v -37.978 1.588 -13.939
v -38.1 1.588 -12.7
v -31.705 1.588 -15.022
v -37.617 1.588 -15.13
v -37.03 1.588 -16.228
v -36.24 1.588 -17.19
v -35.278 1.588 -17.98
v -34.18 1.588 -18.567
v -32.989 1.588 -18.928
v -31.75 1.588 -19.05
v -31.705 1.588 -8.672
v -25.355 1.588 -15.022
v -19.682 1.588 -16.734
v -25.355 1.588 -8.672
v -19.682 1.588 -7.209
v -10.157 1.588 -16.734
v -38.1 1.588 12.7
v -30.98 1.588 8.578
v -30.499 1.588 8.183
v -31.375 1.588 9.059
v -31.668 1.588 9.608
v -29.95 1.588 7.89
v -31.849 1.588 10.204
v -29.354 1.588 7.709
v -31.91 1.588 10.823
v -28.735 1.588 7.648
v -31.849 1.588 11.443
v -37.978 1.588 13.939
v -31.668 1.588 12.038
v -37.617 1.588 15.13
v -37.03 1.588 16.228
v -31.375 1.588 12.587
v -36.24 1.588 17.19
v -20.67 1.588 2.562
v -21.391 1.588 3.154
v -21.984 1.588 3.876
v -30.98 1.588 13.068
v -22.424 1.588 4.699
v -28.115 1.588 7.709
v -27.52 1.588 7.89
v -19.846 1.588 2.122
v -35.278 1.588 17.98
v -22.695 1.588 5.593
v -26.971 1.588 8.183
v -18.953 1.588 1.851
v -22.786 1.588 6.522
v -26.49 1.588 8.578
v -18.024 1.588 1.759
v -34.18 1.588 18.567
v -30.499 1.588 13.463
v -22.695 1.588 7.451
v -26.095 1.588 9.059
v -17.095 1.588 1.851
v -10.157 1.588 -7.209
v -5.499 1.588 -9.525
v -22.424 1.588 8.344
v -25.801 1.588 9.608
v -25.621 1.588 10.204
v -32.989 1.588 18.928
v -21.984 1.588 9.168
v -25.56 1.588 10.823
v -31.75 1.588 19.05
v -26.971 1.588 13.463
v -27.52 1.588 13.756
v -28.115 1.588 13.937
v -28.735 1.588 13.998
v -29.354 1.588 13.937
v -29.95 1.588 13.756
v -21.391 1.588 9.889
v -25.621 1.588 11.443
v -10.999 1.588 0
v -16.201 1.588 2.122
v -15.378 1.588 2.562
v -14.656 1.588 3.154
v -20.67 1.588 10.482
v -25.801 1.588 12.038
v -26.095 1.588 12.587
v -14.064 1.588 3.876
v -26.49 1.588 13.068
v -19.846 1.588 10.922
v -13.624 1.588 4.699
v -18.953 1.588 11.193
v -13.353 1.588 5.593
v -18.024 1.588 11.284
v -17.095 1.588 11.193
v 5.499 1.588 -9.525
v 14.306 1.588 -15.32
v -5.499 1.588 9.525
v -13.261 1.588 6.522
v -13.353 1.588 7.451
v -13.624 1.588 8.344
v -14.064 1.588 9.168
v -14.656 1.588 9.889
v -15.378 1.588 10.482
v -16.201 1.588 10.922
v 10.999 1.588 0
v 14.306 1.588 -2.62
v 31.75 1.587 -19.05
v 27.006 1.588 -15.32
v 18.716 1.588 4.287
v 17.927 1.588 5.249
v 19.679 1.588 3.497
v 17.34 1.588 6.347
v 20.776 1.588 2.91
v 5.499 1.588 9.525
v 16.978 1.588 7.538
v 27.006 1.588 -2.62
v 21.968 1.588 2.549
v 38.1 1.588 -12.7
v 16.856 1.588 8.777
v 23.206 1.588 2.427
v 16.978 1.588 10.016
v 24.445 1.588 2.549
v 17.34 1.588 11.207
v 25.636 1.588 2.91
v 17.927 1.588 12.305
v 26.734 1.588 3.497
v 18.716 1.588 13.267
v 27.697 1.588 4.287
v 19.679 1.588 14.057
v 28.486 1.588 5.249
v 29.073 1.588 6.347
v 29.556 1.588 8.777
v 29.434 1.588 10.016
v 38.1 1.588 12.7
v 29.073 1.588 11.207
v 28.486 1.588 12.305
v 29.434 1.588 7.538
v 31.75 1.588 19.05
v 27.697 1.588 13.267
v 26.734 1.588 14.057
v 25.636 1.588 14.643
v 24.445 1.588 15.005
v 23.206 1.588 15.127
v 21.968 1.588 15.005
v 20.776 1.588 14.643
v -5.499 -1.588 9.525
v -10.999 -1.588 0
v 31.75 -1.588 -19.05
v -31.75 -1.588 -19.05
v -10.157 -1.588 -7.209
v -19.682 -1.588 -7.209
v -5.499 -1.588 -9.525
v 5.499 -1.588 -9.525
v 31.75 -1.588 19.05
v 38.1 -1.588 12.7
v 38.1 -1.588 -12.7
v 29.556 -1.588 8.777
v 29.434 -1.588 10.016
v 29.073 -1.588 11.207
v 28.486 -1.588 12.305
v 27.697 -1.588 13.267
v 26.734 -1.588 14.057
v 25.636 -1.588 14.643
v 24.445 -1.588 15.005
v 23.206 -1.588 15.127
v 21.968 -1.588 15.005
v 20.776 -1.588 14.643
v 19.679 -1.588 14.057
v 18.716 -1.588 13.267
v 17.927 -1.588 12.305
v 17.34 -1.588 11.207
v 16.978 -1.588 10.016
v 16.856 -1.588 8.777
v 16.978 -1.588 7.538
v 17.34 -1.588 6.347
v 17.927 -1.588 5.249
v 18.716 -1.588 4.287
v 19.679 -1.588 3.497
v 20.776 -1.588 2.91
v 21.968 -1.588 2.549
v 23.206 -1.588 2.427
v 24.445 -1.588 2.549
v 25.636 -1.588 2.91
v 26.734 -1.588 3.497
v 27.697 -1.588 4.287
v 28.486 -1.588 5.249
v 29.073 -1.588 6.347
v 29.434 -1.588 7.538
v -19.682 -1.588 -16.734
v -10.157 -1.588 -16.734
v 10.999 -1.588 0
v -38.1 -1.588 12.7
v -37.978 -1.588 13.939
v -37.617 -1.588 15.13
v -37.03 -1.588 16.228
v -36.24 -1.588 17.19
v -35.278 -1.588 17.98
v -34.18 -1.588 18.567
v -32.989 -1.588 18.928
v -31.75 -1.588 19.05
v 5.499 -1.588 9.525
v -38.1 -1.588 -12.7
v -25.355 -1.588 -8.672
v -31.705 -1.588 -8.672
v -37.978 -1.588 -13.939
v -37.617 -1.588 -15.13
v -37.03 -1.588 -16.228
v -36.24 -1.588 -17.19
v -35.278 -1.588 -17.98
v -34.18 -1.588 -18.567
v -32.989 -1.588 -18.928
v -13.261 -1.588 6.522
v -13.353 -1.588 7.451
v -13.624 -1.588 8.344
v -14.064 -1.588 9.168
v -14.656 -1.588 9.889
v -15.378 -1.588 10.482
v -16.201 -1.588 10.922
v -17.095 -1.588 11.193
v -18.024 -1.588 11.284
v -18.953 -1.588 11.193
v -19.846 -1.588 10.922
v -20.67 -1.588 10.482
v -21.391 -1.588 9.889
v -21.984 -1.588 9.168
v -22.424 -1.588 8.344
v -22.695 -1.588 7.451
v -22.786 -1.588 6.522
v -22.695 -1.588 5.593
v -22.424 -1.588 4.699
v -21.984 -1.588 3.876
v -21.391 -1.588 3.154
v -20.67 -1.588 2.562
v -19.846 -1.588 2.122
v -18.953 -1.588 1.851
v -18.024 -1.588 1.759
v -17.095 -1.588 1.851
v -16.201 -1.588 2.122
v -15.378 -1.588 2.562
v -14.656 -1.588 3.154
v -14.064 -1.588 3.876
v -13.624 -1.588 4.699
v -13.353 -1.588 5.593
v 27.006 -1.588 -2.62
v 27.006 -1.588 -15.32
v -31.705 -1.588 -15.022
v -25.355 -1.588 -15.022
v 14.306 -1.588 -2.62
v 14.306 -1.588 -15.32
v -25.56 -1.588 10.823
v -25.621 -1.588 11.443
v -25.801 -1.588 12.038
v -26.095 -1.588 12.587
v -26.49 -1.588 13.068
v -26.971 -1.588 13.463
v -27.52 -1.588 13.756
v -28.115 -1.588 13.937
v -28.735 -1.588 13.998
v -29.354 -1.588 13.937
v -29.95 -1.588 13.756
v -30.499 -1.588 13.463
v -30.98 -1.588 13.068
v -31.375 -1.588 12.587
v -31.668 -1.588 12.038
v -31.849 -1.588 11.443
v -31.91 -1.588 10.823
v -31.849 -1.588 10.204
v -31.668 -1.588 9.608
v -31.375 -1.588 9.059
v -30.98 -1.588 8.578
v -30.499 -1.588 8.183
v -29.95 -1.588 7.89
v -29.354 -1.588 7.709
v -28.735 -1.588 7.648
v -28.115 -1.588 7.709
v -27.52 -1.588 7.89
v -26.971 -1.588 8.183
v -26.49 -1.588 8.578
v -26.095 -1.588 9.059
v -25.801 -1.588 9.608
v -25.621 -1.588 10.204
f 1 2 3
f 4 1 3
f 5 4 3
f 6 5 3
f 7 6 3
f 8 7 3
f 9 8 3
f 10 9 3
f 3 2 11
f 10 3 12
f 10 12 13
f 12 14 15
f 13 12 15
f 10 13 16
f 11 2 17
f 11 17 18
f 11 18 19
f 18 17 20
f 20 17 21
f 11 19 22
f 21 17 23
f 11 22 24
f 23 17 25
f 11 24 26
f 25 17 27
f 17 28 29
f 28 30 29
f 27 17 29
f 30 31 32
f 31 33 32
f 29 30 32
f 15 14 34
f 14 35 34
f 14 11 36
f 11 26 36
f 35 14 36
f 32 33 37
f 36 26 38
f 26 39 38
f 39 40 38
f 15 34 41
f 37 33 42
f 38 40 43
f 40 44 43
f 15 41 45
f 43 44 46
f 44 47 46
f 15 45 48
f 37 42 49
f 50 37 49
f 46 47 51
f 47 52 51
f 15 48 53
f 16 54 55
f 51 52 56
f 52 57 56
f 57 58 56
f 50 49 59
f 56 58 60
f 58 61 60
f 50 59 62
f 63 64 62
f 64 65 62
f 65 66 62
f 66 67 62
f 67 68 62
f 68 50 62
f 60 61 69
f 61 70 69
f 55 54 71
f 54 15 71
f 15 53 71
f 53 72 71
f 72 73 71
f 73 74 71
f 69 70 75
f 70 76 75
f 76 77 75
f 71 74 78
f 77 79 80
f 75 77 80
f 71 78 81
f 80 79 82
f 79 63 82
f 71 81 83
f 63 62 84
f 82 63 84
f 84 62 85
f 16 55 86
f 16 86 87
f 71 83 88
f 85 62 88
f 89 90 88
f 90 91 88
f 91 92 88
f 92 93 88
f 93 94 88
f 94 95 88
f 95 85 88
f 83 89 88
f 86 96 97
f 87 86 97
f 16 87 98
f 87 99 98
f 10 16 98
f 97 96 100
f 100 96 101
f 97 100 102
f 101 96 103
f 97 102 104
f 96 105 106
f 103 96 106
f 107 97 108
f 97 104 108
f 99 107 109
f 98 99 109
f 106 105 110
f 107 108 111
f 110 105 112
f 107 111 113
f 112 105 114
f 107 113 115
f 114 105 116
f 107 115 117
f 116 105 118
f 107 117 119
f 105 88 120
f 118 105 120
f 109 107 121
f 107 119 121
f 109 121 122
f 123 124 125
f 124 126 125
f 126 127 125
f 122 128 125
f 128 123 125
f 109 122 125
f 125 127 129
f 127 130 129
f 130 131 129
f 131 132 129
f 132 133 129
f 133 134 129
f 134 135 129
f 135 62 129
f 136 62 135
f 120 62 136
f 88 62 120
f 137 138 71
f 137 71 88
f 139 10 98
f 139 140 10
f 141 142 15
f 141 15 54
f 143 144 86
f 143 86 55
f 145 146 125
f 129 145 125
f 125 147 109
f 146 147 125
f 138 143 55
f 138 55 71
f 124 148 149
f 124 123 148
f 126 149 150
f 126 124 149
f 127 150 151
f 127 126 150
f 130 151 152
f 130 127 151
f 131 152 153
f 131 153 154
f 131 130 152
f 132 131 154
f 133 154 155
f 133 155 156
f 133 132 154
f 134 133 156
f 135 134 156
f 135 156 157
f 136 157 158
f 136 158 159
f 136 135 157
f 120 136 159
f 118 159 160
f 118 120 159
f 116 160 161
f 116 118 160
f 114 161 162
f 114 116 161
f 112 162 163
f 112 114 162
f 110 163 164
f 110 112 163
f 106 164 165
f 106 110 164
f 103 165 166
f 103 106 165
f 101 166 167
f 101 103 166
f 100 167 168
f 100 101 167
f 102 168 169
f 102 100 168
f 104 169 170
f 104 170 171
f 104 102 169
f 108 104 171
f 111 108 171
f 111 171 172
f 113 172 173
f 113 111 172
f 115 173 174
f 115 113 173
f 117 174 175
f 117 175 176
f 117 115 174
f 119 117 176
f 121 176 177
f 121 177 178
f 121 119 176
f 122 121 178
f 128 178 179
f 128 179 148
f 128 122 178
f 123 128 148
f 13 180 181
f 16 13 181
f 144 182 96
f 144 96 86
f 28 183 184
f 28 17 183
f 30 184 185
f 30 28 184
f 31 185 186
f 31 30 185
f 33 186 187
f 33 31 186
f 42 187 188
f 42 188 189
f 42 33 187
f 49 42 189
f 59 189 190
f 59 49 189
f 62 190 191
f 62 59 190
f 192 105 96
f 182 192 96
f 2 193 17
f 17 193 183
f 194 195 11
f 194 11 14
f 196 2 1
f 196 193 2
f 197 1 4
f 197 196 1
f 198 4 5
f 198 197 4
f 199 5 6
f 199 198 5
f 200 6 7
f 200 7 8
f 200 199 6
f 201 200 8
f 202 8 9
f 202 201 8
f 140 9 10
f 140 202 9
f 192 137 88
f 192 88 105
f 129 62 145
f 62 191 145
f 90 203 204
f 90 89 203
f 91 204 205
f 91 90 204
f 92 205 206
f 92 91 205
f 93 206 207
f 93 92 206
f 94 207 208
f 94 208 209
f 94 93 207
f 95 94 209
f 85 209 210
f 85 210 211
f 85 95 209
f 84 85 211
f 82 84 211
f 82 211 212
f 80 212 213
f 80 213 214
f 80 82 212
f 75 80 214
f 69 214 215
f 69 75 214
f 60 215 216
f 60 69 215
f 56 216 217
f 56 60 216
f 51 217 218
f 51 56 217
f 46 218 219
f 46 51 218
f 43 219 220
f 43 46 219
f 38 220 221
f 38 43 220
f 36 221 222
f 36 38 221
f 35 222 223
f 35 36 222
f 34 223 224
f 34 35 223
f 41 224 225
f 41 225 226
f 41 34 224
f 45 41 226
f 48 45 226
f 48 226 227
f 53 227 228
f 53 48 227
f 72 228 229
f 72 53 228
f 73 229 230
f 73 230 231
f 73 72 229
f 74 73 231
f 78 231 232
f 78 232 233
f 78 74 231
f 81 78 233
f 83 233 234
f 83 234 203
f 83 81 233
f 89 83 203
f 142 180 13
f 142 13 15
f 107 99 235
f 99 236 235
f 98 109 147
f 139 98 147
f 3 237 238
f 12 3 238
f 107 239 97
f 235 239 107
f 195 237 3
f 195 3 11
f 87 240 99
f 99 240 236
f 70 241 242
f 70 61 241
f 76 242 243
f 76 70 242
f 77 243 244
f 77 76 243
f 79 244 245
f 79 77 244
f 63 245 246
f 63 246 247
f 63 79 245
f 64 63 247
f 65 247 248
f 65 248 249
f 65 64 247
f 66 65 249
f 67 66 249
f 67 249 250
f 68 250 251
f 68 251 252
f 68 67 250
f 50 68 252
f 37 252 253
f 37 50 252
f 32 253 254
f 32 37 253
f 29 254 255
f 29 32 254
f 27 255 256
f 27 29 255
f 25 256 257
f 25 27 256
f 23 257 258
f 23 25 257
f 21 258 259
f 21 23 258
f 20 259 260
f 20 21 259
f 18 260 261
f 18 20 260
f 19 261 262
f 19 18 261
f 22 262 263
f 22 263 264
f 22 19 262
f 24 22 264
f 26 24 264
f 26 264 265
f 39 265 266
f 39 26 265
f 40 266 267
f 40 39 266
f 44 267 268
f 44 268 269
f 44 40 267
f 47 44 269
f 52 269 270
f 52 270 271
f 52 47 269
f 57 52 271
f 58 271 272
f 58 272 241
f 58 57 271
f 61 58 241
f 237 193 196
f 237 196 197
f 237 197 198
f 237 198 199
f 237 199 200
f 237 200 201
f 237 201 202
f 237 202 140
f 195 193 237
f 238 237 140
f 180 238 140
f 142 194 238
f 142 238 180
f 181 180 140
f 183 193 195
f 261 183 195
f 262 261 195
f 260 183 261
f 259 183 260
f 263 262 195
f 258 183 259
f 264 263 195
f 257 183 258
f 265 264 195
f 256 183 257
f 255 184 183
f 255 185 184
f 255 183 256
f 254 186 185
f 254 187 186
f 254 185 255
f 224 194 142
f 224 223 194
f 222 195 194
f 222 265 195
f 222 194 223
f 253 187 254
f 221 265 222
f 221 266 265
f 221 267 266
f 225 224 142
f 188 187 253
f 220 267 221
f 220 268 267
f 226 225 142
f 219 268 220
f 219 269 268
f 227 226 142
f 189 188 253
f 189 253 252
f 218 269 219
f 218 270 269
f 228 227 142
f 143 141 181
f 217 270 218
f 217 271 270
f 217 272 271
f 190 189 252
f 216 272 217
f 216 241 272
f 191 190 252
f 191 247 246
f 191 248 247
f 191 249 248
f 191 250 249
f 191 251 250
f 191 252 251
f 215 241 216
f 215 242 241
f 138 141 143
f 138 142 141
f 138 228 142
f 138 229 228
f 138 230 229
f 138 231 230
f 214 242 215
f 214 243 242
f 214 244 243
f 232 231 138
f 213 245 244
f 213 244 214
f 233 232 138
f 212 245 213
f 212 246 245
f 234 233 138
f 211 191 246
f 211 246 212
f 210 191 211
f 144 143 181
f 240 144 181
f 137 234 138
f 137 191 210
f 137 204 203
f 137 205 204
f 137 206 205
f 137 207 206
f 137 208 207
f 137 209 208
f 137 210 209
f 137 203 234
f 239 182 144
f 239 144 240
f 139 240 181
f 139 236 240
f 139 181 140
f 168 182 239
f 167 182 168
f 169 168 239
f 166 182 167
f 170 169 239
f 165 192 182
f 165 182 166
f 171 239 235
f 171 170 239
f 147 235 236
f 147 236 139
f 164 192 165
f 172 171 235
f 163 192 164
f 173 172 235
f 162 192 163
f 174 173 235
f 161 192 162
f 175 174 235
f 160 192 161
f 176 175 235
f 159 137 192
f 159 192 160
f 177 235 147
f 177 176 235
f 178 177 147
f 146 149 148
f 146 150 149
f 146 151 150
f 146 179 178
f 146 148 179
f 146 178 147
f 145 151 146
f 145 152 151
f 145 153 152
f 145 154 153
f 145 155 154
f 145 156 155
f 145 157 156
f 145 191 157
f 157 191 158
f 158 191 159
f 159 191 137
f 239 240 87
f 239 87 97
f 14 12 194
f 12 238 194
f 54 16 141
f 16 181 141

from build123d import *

# Parameters (mm, degrees)
F0_W     = 76.2
F0_H     = 38.1
F0_W_2   = 6.35
F0_H_2   = 6.35
F0_W_3   = 9.525
F0_H_3   = 9.525
F0_W_4   = 12.7
F0_H_4   = 12.7
F0_R     = 4.7625
F0_R_2   = 3.175
F0_R_3   = 6.35
F1_DEPTH = 1.5875
F2_R     = 6.35
F3_SIZE  = 6.35


with BuildPart() as f1:
    # F0 (on Front) → F1 (new body, symmetric)
    with BuildSketch(Plane.XZ):
        Rectangle(F0_W, F0_H)
        with Locations((-28.530458, -11.846916)):
            Rectangle(F0_W_2, F0_H_2, mode=Mode.SUBTRACT)
        with Locations((-14.919388, -11.971785)):
            Rectangle(F0_W_3, F0_H_3, mode=Mode.SUBTRACT)
        with Locations((20.656448, -8.97043)):
            Rectangle(F0_W_4, F0_H_4, mode=Mode.SUBTRACT)
        with Locations((-18.023899, 6.521787)):
            Circle(F0_R, mode=Mode.SUBTRACT)
        with Locations((-28.73469, 10.823162)):
            Circle(F0_R_2, mode=Mode.SUBTRACT)
        Polygon((-10.998523, 0), (-5.499261, 9.525), (5.499261, 9.525), (10.998523, 0), (5.499261, -9.525), (-5.499261, -9.525), align=None, mode=Mode.SUBTRACT)
        with Locations((23.2064, 8.776863)):
            Circle(F0_R_3, mode=Mode.SUBTRACT)
    extrude(amount=F1_DEPTH, both=True)

    # F2
    f2_edges = [f1.edges().sort_by_distance(p)[0] for p in [
        (-38.1, 0, 19.05),
        (-38.1, 0, -19.05),
    ]]
    fillet(f2_edges, radius=F2_R)

    # F3
    f3_edges = [f1.edges().sort_by_distance(p)[0] for p in [
        (38.1, 0, 19.05),
        (38.1, 0, -19.05),
    ]]
    chamfer(f3_edges, length=F3_SIZE)


solid = f1.part
